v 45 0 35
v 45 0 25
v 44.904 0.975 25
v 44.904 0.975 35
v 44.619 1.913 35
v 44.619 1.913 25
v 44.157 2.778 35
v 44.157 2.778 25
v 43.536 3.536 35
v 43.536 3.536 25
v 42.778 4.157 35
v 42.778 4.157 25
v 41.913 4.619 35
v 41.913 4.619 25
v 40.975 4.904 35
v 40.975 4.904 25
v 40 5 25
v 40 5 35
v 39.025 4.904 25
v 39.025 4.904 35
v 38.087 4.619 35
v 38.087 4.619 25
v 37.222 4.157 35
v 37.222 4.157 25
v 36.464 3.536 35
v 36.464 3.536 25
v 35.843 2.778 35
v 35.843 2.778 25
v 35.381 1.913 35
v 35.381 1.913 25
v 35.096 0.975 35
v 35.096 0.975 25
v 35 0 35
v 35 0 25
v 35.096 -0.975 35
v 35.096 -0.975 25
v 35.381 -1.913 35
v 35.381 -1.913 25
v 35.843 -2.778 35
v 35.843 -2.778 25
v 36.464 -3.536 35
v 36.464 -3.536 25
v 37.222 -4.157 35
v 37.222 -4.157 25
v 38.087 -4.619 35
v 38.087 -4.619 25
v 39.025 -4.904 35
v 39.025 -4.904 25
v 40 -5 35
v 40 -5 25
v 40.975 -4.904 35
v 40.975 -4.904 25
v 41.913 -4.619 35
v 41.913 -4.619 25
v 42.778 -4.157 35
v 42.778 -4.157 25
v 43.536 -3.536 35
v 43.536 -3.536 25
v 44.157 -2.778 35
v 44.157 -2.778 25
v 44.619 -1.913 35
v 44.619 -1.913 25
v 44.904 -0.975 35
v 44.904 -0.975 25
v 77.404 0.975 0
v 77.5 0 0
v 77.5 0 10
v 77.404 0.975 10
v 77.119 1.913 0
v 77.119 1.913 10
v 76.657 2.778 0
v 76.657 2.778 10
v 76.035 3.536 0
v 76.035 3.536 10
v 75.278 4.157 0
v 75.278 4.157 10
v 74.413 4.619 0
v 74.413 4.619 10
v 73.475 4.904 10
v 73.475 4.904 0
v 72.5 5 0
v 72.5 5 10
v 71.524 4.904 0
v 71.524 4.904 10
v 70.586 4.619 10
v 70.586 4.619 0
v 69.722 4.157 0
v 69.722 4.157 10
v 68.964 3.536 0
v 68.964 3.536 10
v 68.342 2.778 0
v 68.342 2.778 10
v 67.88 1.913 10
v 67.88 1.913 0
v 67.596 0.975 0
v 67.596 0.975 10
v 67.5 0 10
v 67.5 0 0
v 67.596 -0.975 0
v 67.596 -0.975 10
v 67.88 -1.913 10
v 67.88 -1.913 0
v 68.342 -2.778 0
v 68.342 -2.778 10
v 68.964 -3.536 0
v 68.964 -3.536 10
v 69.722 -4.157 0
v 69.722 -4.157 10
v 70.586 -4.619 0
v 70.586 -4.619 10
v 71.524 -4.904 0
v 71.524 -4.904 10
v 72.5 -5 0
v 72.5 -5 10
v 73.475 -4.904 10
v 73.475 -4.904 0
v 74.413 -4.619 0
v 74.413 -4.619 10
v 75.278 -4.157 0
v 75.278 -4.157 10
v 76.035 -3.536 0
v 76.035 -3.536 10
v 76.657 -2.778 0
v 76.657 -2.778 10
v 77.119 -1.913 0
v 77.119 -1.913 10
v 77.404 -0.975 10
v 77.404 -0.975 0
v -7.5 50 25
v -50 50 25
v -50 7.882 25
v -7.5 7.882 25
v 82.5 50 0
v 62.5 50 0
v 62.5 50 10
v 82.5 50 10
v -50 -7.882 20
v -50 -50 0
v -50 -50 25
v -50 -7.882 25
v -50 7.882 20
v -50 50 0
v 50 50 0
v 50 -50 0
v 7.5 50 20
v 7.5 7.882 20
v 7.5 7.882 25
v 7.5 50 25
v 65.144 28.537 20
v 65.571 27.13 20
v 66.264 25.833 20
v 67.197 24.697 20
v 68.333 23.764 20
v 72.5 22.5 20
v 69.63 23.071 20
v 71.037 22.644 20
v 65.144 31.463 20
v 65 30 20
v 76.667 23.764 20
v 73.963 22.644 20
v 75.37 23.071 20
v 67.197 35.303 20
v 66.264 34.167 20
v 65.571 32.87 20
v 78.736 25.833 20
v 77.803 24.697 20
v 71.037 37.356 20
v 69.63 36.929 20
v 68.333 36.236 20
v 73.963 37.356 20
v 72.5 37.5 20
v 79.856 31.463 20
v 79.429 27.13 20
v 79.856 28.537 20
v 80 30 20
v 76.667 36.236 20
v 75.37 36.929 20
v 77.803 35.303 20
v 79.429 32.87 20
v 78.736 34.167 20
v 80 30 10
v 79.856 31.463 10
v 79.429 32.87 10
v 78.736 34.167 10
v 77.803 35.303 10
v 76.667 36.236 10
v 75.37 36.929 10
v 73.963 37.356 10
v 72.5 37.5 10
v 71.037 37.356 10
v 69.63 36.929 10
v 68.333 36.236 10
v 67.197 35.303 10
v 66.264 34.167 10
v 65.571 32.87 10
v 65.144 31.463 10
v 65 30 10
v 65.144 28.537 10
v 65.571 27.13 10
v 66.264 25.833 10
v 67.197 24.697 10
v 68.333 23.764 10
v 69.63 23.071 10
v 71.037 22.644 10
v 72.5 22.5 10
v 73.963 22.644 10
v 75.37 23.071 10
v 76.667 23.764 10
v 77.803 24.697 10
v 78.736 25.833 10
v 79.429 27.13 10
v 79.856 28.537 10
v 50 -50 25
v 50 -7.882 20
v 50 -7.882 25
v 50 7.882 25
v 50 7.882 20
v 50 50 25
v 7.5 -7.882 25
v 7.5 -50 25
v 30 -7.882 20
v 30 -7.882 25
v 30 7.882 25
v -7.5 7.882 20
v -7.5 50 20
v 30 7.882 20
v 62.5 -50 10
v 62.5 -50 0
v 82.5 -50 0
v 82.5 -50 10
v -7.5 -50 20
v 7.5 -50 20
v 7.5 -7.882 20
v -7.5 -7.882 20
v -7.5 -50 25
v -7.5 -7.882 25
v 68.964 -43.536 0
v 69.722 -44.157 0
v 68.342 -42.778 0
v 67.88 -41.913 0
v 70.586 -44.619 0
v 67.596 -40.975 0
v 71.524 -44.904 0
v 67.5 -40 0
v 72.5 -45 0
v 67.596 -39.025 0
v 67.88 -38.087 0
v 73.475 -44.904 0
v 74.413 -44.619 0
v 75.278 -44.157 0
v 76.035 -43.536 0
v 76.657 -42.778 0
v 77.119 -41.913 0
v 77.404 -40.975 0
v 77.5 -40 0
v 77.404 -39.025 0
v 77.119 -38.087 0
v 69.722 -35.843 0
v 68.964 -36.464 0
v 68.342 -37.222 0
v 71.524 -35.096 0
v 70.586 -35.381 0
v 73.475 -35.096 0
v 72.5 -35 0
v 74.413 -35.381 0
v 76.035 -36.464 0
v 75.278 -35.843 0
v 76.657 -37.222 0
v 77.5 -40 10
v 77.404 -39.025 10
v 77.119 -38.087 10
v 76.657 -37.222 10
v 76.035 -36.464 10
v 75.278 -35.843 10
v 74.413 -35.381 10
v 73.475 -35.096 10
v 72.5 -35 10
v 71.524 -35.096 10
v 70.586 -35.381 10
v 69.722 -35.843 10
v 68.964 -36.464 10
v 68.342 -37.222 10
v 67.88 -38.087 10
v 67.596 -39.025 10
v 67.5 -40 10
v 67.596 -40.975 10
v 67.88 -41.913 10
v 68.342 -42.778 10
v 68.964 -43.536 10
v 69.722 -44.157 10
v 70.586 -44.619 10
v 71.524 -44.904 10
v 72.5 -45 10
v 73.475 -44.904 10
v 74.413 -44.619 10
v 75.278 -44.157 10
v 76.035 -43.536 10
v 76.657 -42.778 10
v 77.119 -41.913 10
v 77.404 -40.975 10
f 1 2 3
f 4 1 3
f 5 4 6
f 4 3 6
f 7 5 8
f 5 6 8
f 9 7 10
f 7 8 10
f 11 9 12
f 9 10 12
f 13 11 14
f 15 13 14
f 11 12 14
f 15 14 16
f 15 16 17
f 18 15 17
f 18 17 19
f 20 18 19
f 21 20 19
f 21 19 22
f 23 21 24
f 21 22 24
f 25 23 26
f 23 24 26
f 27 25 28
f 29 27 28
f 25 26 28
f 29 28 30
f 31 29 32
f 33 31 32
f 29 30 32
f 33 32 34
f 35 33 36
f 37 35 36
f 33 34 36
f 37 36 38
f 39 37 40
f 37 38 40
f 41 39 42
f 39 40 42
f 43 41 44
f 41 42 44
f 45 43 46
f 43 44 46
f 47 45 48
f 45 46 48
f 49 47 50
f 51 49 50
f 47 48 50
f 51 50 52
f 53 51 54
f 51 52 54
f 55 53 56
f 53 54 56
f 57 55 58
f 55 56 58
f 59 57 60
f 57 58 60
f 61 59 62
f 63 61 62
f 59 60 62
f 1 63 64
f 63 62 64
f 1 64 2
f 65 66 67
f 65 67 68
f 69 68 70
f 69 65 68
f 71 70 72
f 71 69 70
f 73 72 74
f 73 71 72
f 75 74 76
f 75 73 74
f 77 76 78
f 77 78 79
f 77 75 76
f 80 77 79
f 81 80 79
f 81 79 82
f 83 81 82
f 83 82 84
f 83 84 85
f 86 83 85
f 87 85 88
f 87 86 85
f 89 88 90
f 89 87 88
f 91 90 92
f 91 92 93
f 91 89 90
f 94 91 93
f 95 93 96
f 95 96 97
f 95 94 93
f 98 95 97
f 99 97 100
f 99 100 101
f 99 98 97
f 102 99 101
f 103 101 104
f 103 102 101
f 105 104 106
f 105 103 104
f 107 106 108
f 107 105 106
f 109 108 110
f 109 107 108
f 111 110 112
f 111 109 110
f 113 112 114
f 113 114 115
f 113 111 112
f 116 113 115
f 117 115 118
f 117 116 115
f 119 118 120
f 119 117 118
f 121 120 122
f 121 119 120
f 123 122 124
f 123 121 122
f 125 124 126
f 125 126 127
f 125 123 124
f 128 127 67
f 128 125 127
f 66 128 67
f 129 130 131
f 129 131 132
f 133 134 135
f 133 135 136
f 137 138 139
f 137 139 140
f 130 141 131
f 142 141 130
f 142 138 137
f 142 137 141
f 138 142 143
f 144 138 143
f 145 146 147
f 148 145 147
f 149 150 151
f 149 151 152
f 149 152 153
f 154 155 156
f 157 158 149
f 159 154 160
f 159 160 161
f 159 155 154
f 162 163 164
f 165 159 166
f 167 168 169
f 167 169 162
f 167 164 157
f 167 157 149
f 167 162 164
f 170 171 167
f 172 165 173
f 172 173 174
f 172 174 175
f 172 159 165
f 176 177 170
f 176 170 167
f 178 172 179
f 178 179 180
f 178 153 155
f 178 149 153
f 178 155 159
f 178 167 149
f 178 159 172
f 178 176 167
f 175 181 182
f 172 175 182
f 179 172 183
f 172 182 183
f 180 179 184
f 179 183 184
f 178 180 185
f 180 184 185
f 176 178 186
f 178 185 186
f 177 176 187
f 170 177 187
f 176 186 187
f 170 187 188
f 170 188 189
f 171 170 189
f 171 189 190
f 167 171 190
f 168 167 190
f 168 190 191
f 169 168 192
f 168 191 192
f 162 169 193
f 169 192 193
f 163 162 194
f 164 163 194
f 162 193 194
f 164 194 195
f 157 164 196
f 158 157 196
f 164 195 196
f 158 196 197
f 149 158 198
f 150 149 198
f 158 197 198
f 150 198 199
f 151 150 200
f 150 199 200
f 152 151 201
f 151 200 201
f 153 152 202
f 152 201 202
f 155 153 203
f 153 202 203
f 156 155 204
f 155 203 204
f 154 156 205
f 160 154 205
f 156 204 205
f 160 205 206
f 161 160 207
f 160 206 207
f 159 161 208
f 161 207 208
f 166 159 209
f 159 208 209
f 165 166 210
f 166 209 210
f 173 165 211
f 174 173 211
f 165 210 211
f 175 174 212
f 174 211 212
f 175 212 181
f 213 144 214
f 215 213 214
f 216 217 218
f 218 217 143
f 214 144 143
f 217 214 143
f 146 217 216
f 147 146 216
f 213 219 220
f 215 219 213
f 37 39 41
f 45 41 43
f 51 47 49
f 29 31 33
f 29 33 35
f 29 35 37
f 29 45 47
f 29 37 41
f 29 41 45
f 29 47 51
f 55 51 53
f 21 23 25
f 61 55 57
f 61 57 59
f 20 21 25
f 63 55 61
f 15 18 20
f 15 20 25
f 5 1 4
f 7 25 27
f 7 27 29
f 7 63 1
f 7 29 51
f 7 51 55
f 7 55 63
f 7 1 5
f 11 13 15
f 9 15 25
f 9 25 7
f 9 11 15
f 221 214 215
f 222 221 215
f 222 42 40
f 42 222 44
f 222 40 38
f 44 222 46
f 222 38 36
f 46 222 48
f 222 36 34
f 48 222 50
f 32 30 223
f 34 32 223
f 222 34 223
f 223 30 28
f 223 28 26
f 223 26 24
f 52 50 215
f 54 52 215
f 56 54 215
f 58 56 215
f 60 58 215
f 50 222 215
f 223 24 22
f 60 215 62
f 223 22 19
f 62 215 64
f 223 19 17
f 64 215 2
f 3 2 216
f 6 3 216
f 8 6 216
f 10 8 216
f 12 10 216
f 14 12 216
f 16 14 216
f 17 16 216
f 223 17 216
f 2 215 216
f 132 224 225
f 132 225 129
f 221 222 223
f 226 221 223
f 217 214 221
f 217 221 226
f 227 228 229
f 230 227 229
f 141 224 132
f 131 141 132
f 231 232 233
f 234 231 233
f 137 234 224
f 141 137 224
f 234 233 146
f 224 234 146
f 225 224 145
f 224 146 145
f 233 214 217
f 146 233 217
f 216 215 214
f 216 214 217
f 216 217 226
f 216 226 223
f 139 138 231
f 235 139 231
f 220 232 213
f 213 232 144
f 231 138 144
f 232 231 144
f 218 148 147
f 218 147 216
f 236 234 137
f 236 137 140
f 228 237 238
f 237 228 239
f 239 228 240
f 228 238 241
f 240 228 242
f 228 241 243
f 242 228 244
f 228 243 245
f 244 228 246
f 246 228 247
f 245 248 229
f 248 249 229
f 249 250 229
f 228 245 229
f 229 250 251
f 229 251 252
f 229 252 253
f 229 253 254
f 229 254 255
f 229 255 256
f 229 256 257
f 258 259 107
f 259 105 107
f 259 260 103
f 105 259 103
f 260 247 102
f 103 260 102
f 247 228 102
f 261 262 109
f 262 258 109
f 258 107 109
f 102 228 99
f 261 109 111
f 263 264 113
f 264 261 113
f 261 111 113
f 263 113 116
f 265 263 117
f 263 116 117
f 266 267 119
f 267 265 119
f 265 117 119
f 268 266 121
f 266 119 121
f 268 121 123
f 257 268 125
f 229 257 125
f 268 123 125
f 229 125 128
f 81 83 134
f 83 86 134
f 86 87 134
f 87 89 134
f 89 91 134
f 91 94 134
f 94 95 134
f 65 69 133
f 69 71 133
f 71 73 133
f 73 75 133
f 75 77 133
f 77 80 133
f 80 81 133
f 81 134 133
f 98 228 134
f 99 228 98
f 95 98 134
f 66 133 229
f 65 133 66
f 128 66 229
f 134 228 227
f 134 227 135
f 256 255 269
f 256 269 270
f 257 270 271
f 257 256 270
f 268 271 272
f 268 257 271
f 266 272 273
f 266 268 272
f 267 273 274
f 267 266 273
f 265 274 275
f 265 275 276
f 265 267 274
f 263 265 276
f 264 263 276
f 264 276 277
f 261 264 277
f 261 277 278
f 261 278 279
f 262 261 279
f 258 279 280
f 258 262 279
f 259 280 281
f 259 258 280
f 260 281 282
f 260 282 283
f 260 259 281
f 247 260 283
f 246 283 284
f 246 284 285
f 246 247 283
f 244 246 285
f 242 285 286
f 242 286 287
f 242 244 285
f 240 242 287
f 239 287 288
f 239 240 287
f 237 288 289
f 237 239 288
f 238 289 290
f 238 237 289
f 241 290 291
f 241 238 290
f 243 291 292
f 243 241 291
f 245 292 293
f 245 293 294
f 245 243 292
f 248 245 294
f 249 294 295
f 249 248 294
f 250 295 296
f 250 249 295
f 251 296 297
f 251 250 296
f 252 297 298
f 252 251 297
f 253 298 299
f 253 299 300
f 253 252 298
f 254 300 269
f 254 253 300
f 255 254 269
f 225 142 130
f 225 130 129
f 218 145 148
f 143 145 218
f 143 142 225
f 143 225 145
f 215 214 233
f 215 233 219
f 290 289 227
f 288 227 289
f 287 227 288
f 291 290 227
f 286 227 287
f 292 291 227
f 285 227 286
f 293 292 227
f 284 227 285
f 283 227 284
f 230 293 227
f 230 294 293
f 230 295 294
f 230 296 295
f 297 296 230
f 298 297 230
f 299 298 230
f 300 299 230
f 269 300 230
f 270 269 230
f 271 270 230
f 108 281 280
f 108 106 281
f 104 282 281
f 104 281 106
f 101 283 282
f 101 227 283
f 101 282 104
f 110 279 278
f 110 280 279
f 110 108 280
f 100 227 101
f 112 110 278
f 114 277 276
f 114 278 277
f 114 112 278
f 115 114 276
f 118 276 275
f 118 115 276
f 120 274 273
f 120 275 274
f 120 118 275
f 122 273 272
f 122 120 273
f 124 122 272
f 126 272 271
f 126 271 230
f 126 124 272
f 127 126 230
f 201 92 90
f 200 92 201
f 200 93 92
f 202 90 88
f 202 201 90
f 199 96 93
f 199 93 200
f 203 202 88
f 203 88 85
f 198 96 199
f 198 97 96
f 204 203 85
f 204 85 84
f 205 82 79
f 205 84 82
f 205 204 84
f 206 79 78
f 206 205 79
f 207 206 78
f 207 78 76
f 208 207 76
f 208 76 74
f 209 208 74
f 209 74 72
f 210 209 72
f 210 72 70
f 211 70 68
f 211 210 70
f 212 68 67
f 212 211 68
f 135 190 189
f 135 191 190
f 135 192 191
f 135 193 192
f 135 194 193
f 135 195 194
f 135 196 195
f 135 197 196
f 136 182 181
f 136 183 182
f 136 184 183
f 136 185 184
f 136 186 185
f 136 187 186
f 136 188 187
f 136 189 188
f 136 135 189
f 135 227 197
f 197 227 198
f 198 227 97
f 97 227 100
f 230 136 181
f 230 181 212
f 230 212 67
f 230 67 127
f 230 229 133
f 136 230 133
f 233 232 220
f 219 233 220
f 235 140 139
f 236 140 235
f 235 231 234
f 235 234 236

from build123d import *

# Parameters (mm, degrees)
F0_W      = 100
F0_H      = 100
F1_DEPTH  = 25
F2_W      = 15.764678
F2_H      = 5
F3_DEPTH  = 100
F4_W      = 15
F4_H      = 5
F5_DEPTH  = 100
F6_DEPTH  = 20
F7_R      = 5
F8_DEPTH  = 10
F9_W      = 20
F9_H      = 100
F9_R      = 5
F10_DEPTH = 10
F11_R     = 7.5
F12_DEPTH = 10


with BuildPart() as f1:
    # F0 (on Top) → F1 (new body)
    with BuildSketch(Plane.XY):
        Rectangle(F0_W, F0_H)
    extrude(amount=F1_DEPTH)

    # F2 (on face) → F3 (cut, through all)
    with BuildSketch(Plane.YZ.offset(50)):
        with Locations((0, 22.5)):
            Rectangle(F2_W, F2_H)
    extrude(amount=-F3_DEPTH, mode=Mode.SUBTRACT)

    # F4 (on face) → F5 (cut, through all)
    with BuildSketch(Plane.XZ.offset(50)):
        with Locations((0, 22.5)):
            Rectangle(F4_W, F4_H)
    extrude(amount=-F5_DEPTH, mode=Mode.SUBTRACT)


with BuildPart() as f6:
    # F2 (on face) → F6 (new body)
    with BuildSketch(Plane.YZ.offset(50)):
        with Locations((0, 22.5)):
            Rectangle(F2_W, F2_H)
    extrude(amount=-F6_DEPTH)

    # F7 (on face) → F8 (join)
    with BuildSketch(Plane.XY.offset(25)):
        with Locations((40, 0)):
            Circle(F7_R)
    extrude(amount=F8_DEPTH)


with BuildPart() as f10:
    # F9 (on Top) → F10 (new body)
    with BuildSketch(Plane.XY):
        with Locations((72.499827, 0)):
            Rectangle(F9_W, F9_H)
        with Locations((72.499827, -40)):
            Circle(F9_R, mode=Mode.SUBTRACT)
        with Locations((72.499827, 0)):
            Circle(F9_R, mode=Mode.SUBTRACT)
    extrude(amount=F10_DEPTH)

    # F11 (on face) → F12 (join)
    with BuildSketch(Plane.XY.offset(10)):
        with Locations((72.499827, 30)):
            Circle(F11_R)
    extrude(amount=F12_DEPTH)


solid = Compound([f1.part, f6.part, f10.part])
